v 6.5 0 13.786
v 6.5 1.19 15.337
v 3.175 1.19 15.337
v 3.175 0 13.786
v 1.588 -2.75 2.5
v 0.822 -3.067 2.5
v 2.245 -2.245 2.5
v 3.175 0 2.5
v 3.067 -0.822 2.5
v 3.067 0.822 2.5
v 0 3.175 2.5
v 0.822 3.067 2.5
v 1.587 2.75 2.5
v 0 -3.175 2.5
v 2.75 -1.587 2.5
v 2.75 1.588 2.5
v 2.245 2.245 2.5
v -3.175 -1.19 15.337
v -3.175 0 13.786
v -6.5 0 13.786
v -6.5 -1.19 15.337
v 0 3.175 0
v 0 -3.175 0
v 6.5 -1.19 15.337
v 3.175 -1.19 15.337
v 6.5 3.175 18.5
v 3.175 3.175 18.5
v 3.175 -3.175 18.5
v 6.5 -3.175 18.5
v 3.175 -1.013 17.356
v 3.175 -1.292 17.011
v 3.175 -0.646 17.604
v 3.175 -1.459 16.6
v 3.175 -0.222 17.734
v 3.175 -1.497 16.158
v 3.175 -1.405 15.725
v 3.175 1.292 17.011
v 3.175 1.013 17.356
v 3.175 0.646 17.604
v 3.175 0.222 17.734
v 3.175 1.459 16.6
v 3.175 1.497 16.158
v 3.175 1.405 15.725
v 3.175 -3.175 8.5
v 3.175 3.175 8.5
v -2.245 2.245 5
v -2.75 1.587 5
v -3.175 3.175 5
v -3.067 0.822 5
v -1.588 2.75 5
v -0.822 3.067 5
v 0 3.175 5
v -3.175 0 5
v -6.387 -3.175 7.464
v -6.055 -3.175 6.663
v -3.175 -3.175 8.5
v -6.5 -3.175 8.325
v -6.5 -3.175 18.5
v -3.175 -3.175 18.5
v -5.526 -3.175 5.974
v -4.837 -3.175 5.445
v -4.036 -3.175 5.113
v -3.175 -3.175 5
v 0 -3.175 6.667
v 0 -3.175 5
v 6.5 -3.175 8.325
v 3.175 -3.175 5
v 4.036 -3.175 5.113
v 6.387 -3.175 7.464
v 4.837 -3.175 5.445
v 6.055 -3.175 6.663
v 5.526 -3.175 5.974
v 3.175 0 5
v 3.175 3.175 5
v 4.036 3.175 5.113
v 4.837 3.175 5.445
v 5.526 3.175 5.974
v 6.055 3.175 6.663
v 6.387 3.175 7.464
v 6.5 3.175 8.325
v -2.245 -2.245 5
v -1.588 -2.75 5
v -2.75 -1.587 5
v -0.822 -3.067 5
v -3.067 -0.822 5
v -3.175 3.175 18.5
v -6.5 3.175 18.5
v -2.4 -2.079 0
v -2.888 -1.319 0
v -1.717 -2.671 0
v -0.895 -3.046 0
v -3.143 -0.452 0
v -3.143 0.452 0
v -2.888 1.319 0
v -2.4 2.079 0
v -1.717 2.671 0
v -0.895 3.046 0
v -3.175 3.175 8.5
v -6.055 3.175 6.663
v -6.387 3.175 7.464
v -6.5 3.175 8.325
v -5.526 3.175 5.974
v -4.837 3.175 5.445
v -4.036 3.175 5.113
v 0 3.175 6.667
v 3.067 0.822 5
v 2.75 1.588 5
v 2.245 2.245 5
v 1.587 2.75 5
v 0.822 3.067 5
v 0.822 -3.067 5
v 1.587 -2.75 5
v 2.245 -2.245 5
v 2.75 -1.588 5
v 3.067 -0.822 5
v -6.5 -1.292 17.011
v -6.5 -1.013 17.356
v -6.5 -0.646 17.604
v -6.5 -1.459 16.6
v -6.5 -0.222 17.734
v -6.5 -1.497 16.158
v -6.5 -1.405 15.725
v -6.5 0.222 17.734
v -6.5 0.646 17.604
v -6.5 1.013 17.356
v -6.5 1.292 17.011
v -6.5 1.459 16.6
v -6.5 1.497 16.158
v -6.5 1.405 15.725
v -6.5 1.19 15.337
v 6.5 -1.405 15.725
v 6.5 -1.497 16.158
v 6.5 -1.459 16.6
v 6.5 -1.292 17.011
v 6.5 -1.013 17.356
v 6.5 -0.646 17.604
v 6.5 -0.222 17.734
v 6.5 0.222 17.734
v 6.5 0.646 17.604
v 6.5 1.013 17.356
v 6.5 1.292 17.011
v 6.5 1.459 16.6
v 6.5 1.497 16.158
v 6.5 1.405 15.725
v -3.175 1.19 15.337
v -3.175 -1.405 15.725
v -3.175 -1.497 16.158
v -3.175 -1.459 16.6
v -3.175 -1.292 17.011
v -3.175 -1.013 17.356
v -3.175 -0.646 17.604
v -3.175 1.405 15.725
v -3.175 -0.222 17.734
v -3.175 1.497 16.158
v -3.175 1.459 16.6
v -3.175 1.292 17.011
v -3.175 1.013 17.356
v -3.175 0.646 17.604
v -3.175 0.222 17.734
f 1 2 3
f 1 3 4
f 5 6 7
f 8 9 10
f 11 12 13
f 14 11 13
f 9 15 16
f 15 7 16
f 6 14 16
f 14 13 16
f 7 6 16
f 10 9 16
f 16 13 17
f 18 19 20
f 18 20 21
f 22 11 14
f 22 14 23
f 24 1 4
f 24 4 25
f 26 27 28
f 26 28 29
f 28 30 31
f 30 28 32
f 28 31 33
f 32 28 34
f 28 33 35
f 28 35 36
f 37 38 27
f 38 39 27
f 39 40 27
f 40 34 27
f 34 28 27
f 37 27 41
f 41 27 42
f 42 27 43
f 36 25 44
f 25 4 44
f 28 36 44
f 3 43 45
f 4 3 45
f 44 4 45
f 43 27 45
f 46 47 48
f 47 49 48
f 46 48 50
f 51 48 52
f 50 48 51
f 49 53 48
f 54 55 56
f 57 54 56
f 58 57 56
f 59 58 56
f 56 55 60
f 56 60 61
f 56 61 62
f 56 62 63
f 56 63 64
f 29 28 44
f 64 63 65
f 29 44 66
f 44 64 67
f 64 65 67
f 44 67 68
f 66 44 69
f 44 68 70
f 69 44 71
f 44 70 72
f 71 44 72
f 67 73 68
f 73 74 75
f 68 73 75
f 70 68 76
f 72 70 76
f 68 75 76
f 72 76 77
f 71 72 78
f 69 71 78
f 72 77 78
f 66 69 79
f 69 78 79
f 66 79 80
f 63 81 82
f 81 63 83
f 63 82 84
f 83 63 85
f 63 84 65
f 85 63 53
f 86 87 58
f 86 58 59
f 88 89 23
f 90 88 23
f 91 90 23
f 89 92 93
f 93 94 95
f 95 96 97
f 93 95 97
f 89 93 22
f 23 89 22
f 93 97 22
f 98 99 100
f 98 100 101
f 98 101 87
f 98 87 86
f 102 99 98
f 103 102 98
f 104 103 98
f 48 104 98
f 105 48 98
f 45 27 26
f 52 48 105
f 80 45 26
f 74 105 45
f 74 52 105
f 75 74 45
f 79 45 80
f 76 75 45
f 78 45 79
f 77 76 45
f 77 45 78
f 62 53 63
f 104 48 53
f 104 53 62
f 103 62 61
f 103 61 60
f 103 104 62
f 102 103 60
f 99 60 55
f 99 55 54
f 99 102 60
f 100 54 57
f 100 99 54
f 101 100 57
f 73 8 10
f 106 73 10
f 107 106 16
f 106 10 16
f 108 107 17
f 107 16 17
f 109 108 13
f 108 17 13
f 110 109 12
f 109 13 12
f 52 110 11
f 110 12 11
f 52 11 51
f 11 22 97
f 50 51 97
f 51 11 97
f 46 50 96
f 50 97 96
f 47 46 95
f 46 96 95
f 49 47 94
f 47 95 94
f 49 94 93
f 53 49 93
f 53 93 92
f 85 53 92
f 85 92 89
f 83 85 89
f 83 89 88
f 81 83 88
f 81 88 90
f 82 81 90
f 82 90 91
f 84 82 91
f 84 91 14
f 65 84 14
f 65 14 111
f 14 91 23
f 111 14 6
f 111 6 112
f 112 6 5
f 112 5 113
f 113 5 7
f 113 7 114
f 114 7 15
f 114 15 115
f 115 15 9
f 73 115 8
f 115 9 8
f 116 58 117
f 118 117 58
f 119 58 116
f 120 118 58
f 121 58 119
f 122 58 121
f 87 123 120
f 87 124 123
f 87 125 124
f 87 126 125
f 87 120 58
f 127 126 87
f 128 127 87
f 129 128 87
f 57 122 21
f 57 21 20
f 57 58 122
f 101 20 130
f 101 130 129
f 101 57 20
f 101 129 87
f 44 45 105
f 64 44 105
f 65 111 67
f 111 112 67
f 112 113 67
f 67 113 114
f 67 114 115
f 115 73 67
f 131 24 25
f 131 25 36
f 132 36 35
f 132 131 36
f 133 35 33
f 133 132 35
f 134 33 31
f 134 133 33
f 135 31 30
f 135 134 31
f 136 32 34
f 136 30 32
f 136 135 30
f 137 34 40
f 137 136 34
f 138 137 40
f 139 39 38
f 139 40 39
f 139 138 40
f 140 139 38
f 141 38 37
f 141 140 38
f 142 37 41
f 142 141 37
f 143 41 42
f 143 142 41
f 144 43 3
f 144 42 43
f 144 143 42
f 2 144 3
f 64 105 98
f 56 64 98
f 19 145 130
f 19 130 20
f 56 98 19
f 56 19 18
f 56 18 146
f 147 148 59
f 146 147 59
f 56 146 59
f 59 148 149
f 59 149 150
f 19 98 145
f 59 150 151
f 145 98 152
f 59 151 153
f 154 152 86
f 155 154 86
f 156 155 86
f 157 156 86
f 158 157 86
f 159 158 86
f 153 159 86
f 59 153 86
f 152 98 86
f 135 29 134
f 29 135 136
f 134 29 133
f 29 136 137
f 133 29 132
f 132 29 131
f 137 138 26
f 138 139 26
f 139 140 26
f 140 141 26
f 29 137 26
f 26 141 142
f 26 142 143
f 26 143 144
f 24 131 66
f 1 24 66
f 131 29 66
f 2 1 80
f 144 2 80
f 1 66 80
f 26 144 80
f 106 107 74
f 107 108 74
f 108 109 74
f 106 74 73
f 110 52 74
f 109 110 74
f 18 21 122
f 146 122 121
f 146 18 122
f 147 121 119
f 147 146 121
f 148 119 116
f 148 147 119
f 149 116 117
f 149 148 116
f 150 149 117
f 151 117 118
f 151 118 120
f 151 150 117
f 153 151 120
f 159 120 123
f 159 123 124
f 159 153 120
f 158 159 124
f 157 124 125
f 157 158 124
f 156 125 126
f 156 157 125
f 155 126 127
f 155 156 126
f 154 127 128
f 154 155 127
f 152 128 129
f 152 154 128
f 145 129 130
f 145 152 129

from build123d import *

# Parameters (mm, degrees)
CROQUIS1_R                        = 3.175
SALIENTE_EXTRUIR1_DEPTH           = 5
CROQUIS2_W                        = 13
CROQUIS2_H                        = 6.35
SALIENTE_EXTRUIR2_DEPTH           = 13.5
CORTAR_EXTRUIR2_REACH             = 5.175
CROQUIS5_W                        = 3.175
CROQUIS5_H                        = 2.5
CORTAR_EXTRUIR2_DIRECTION_2_REACH = 5.175
CORTAR_EXTRUIR6_REACH             = 8.35
CORTAR_EXTRUIR7_DEPTH             = 6.35
CORTAR_EXTRUIR8_DEPTH             = 13


with BuildPart() as part:
    # Croquis1 → Saliente-Extruir1 (new body)
    with BuildSketch(Plane.XY):
        Circle(CROQUIS1_R)
    extrude(amount=SALIENTE_EXTRUIR1_DEPTH)

    # Croquis2 → Saliente-Extruir2 (add)
    with BuildSketch(Plane.XY.offset(5)):
        Rectangle(CROQUIS2_W, CROQUIS2_H)
    extrude(amount=SALIENTE_EXTRUIR2_DEPTH)

    # Croquis5 → Cortar-Extruir2 (cut, up to next)
    with BuildSketch(Plane(origin=(0, 0, 0), x_dir=(1, 0, 0), z_dir=(0, 1, 0)), mode=Mode.PRIVATE) as cortar_extruir2_sk1:
        with Locations((1.5875, -1.25)):
            Rectangle(CROQUIS5_W, CROQUIS5_H)
    cortar_extruir2_tool1 = extrude(cortar_extruir2_sk1.sketch, amount=-CORTAR_EXTRUIR2_REACH, mode=Mode.PRIVATE) & part.part
    add(cortar_extruir2_tool1.solids().sort_by_distance((1.5875, 0, 1.25))[0], mode=Mode.SUBTRACT)

    # Croquis5 → Cortar-Extruir2 direction 2 (cut, up to next)
    with BuildSketch(Plane(origin=(0, 0, 0), x_dir=(1, 0, 0), z_dir=(0, 1, 0)), mode=Mode.PRIVATE) as cortar_extruir2_direction_2_sk1:
        with Locations((1.5875, -1.25)):
            Rectangle(CROQUIS5_W, CROQUIS5_H)
    cortar_extruir2_direction_2_tool1 = extrude(cortar_extruir2_direction_2_sk1.sketch, amount=CORTAR_EXTRUIR2_DIRECTION_2_REACH, mode=Mode.PRIVATE) & part.part
    add(cortar_extruir2_direction_2_tool1.solids().sort_by_distance((1.5875, 0, 1.25))[0], mode=Mode.SUBTRACT)

    # Croquis7 → Cortar-Extruir6 (cut, up to next)
    with BuildSketch(Plane(origin=(0, 3.175, 0), x_dir=(1, 0, 0), z_dir=(0, 1, 0)), mode=Mode.PRIVATE) as cortar_extruir6_sk1:
        Polygon((-3.175, -18.5), (3.175, -18.5), (3.175, -8.5), (0, -6.666912895), (-3.175, -8.5), align=None)
    cortar_extruir6_tool1 = extrude(cortar_extruir6_sk1.sketch, amount=-CORTAR_EXTRUIR6_REACH, mode=Mode.PRIVATE) & part.part
    add(cortar_extruir6_tool1.solids().sort_by_distance((0, 3.175, 13.028903))[0], mode=Mode.SUBTRACT)

    # Croquis8 → Cortar-Extruir7 (cut)
    with BuildSketch(Plane(origin=(0, 3.175, 0), x_dir=(1, 0, 0), z_dir=(0, 1, 0))):
        with BuildLine():
            Line((-6.5, -5), (-3.175, -5))
            ThreePointArc((-3.175, -5), (-5.526130047, -5.973869953), (-6.5, -8.325))
            Line((-6.5, -8.325), (-6.5, -5))
        make_face()
    cortar_extruir7 = extrude(amount=-CORTAR_EXTRUIR7_DEPTH, mode=Mode.SUBTRACT)

    # Simetría1: Cortar-Extruir7 across plane
    add(cortar_extruir7.mirror(Plane(origin=(0, 0, 0), x_dir=(0, 0, 1), z_dir=(1, 0, 0))), mode=Mode.SUBTRACT)

    # Croquis9 → Cortar-Extruir8 (cut)
    with BuildSketch(Plane(origin=(6.5, 0, 0), x_dir=(0, 0, -1), z_dir=(1, 0, 0))):
        with BuildLine():
            Line((-15.336857856, 1.19003001), (-13.785980552, 0))
            Line((-13.785980552, 0), (-15.336857856, -1.19003001))
            ThreePointArc((-15.336857856, -1.19003001), (-17.75, 0), (-15.336857856, 1.19003001))
        make_face()
    extrude(amount=-CORTAR_EXTRUIR8_DEPTH, mode=Mode.SUBTRACT)


solid = part.part
